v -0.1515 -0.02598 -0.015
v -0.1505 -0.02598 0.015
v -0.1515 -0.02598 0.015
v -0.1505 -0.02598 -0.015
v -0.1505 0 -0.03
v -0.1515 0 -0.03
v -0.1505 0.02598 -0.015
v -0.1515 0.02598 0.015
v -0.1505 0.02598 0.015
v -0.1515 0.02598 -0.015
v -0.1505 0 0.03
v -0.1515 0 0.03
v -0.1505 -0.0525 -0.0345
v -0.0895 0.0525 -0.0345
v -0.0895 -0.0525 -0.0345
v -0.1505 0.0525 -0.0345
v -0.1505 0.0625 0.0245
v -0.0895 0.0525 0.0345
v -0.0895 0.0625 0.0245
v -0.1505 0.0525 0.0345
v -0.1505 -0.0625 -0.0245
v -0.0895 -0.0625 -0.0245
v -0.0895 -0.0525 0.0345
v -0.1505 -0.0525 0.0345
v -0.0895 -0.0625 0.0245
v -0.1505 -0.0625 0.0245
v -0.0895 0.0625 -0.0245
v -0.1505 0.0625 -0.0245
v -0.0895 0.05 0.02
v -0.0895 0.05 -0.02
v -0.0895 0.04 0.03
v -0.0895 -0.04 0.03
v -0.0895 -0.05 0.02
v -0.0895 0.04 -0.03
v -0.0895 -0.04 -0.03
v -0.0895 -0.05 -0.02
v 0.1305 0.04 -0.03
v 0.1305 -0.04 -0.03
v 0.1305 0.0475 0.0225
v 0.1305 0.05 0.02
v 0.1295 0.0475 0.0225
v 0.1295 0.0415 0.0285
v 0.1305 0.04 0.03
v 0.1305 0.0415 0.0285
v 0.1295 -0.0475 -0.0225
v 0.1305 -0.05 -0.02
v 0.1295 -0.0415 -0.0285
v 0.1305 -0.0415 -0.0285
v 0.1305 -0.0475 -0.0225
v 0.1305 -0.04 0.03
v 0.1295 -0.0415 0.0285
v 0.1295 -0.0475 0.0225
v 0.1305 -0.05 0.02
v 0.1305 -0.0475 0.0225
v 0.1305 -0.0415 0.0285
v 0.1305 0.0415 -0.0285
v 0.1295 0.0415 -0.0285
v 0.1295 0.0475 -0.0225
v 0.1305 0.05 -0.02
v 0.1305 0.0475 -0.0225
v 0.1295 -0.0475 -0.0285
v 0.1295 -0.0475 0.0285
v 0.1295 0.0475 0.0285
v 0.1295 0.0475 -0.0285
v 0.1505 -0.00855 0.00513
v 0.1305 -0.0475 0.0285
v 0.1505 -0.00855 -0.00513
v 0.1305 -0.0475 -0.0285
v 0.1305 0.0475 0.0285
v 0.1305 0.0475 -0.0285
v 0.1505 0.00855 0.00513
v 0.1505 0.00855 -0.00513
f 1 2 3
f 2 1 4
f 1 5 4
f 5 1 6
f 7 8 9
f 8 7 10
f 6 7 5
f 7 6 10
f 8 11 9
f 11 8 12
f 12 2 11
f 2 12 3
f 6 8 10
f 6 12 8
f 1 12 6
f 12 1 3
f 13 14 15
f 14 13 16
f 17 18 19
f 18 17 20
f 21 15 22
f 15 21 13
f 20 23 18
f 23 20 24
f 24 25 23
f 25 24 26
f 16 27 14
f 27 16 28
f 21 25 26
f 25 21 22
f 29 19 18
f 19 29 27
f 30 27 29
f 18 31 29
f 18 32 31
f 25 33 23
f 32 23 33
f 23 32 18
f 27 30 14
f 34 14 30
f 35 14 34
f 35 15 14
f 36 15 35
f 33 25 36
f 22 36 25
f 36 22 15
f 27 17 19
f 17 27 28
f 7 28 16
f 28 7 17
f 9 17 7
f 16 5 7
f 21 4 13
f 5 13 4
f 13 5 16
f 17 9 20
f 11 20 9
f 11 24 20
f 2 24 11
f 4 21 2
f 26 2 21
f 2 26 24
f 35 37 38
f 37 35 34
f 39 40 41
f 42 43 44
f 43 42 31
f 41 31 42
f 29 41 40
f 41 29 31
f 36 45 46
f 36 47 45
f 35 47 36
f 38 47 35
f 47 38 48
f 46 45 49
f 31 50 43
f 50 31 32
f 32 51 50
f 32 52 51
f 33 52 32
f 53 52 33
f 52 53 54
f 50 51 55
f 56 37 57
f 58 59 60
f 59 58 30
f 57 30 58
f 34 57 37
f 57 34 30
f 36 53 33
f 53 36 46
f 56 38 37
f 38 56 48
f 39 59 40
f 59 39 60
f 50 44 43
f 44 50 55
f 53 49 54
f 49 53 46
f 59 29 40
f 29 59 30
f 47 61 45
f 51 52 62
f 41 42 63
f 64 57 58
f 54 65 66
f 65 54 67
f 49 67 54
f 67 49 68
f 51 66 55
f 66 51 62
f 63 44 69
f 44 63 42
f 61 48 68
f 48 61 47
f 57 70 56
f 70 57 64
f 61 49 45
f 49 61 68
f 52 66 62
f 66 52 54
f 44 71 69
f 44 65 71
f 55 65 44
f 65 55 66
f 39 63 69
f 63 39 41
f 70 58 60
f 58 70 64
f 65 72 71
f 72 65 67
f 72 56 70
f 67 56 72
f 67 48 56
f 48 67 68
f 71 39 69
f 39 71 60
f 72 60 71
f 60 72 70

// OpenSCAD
$fn=64;

L = 0.30;
W = 0.10;
H = 0.06;

shaft_L = 0.22;
head_L  = 0.06;
tip_L   = L - shaft_L - head_L;

module faceted_prism(len, w, h, facet=0.012) {
    hull() {
        translate([-len/2, 0, 0]) cube([0.001, w-2*facet, h], center=true);
        translate([ len/2, 0, 0]) cube([0.001, w-2*facet, h], center=true);
        translate([-len/2, 0, 0]) cube([0.001, w, h-2*facet], center=true);
        translate([ len/2, 0, 0]) cube([0.001, w, h-2*facet], center=true);
    }
}

module tapered_tip(len, w, h, tip_scale=0.25) {
    hull() {
        translate([-len/2, 0, 0]) cube([0.001, w, h], center=true);
        translate([ len/2, 0, 0]) scale([1, tip_scale, tip_scale]) cube([0.001, w, h], center=true);
    }
}

module collar_with_socket(len, r, h, socket=0.028, depth=0.035) {
    difference() {
        union() {
            translate([0,0,0]) cylinder(h=len, r=r, center=true, $fn=6);
            translate([0,0,0]) cylinder(h=len*0.55, r=r*0.92, center=true, $fn=64);
        }
        translate([0,0, len/2 - depth/2 + 0.0001])
            rotate([0,0,45])
                cube([socket, socket, depth+0.0002], center=true);
        translate([0,0, len/2 - depth + 0.0001])
            cylinder(h=depth*0.35, r=socket*0.35, center=false, $fn=32);
    }
}

module head_block(len, w, h) {
    faceted_prism(len, w, h, facet=0.010);
}

module tool_body() {
    union() {
        translate([-(L/2) + head_L/2, 0, 0])
            head_block(head_L, W*1.25, H*1.15);

        translate([-(L/2) + head_L + shaft_L/2, 0, 0])
            faceted_prism(shaft_L, W, H, facet=0.010);

        translate([-(L/2) + head_L + shaft_L + tip_L/2, 0, 0])
            tapered_tip(tip_L, W*0.95, H*0.95, tip_scale=0.18);

        translate([-(L/2) + head_L*0.35, 0, 0])
            rotate([0,90,0])
                collar_with_socket(len=0.045, r=0.030, h=H*1.2, socket=0.028, depth=0.030);
    }
}

tool_body();
